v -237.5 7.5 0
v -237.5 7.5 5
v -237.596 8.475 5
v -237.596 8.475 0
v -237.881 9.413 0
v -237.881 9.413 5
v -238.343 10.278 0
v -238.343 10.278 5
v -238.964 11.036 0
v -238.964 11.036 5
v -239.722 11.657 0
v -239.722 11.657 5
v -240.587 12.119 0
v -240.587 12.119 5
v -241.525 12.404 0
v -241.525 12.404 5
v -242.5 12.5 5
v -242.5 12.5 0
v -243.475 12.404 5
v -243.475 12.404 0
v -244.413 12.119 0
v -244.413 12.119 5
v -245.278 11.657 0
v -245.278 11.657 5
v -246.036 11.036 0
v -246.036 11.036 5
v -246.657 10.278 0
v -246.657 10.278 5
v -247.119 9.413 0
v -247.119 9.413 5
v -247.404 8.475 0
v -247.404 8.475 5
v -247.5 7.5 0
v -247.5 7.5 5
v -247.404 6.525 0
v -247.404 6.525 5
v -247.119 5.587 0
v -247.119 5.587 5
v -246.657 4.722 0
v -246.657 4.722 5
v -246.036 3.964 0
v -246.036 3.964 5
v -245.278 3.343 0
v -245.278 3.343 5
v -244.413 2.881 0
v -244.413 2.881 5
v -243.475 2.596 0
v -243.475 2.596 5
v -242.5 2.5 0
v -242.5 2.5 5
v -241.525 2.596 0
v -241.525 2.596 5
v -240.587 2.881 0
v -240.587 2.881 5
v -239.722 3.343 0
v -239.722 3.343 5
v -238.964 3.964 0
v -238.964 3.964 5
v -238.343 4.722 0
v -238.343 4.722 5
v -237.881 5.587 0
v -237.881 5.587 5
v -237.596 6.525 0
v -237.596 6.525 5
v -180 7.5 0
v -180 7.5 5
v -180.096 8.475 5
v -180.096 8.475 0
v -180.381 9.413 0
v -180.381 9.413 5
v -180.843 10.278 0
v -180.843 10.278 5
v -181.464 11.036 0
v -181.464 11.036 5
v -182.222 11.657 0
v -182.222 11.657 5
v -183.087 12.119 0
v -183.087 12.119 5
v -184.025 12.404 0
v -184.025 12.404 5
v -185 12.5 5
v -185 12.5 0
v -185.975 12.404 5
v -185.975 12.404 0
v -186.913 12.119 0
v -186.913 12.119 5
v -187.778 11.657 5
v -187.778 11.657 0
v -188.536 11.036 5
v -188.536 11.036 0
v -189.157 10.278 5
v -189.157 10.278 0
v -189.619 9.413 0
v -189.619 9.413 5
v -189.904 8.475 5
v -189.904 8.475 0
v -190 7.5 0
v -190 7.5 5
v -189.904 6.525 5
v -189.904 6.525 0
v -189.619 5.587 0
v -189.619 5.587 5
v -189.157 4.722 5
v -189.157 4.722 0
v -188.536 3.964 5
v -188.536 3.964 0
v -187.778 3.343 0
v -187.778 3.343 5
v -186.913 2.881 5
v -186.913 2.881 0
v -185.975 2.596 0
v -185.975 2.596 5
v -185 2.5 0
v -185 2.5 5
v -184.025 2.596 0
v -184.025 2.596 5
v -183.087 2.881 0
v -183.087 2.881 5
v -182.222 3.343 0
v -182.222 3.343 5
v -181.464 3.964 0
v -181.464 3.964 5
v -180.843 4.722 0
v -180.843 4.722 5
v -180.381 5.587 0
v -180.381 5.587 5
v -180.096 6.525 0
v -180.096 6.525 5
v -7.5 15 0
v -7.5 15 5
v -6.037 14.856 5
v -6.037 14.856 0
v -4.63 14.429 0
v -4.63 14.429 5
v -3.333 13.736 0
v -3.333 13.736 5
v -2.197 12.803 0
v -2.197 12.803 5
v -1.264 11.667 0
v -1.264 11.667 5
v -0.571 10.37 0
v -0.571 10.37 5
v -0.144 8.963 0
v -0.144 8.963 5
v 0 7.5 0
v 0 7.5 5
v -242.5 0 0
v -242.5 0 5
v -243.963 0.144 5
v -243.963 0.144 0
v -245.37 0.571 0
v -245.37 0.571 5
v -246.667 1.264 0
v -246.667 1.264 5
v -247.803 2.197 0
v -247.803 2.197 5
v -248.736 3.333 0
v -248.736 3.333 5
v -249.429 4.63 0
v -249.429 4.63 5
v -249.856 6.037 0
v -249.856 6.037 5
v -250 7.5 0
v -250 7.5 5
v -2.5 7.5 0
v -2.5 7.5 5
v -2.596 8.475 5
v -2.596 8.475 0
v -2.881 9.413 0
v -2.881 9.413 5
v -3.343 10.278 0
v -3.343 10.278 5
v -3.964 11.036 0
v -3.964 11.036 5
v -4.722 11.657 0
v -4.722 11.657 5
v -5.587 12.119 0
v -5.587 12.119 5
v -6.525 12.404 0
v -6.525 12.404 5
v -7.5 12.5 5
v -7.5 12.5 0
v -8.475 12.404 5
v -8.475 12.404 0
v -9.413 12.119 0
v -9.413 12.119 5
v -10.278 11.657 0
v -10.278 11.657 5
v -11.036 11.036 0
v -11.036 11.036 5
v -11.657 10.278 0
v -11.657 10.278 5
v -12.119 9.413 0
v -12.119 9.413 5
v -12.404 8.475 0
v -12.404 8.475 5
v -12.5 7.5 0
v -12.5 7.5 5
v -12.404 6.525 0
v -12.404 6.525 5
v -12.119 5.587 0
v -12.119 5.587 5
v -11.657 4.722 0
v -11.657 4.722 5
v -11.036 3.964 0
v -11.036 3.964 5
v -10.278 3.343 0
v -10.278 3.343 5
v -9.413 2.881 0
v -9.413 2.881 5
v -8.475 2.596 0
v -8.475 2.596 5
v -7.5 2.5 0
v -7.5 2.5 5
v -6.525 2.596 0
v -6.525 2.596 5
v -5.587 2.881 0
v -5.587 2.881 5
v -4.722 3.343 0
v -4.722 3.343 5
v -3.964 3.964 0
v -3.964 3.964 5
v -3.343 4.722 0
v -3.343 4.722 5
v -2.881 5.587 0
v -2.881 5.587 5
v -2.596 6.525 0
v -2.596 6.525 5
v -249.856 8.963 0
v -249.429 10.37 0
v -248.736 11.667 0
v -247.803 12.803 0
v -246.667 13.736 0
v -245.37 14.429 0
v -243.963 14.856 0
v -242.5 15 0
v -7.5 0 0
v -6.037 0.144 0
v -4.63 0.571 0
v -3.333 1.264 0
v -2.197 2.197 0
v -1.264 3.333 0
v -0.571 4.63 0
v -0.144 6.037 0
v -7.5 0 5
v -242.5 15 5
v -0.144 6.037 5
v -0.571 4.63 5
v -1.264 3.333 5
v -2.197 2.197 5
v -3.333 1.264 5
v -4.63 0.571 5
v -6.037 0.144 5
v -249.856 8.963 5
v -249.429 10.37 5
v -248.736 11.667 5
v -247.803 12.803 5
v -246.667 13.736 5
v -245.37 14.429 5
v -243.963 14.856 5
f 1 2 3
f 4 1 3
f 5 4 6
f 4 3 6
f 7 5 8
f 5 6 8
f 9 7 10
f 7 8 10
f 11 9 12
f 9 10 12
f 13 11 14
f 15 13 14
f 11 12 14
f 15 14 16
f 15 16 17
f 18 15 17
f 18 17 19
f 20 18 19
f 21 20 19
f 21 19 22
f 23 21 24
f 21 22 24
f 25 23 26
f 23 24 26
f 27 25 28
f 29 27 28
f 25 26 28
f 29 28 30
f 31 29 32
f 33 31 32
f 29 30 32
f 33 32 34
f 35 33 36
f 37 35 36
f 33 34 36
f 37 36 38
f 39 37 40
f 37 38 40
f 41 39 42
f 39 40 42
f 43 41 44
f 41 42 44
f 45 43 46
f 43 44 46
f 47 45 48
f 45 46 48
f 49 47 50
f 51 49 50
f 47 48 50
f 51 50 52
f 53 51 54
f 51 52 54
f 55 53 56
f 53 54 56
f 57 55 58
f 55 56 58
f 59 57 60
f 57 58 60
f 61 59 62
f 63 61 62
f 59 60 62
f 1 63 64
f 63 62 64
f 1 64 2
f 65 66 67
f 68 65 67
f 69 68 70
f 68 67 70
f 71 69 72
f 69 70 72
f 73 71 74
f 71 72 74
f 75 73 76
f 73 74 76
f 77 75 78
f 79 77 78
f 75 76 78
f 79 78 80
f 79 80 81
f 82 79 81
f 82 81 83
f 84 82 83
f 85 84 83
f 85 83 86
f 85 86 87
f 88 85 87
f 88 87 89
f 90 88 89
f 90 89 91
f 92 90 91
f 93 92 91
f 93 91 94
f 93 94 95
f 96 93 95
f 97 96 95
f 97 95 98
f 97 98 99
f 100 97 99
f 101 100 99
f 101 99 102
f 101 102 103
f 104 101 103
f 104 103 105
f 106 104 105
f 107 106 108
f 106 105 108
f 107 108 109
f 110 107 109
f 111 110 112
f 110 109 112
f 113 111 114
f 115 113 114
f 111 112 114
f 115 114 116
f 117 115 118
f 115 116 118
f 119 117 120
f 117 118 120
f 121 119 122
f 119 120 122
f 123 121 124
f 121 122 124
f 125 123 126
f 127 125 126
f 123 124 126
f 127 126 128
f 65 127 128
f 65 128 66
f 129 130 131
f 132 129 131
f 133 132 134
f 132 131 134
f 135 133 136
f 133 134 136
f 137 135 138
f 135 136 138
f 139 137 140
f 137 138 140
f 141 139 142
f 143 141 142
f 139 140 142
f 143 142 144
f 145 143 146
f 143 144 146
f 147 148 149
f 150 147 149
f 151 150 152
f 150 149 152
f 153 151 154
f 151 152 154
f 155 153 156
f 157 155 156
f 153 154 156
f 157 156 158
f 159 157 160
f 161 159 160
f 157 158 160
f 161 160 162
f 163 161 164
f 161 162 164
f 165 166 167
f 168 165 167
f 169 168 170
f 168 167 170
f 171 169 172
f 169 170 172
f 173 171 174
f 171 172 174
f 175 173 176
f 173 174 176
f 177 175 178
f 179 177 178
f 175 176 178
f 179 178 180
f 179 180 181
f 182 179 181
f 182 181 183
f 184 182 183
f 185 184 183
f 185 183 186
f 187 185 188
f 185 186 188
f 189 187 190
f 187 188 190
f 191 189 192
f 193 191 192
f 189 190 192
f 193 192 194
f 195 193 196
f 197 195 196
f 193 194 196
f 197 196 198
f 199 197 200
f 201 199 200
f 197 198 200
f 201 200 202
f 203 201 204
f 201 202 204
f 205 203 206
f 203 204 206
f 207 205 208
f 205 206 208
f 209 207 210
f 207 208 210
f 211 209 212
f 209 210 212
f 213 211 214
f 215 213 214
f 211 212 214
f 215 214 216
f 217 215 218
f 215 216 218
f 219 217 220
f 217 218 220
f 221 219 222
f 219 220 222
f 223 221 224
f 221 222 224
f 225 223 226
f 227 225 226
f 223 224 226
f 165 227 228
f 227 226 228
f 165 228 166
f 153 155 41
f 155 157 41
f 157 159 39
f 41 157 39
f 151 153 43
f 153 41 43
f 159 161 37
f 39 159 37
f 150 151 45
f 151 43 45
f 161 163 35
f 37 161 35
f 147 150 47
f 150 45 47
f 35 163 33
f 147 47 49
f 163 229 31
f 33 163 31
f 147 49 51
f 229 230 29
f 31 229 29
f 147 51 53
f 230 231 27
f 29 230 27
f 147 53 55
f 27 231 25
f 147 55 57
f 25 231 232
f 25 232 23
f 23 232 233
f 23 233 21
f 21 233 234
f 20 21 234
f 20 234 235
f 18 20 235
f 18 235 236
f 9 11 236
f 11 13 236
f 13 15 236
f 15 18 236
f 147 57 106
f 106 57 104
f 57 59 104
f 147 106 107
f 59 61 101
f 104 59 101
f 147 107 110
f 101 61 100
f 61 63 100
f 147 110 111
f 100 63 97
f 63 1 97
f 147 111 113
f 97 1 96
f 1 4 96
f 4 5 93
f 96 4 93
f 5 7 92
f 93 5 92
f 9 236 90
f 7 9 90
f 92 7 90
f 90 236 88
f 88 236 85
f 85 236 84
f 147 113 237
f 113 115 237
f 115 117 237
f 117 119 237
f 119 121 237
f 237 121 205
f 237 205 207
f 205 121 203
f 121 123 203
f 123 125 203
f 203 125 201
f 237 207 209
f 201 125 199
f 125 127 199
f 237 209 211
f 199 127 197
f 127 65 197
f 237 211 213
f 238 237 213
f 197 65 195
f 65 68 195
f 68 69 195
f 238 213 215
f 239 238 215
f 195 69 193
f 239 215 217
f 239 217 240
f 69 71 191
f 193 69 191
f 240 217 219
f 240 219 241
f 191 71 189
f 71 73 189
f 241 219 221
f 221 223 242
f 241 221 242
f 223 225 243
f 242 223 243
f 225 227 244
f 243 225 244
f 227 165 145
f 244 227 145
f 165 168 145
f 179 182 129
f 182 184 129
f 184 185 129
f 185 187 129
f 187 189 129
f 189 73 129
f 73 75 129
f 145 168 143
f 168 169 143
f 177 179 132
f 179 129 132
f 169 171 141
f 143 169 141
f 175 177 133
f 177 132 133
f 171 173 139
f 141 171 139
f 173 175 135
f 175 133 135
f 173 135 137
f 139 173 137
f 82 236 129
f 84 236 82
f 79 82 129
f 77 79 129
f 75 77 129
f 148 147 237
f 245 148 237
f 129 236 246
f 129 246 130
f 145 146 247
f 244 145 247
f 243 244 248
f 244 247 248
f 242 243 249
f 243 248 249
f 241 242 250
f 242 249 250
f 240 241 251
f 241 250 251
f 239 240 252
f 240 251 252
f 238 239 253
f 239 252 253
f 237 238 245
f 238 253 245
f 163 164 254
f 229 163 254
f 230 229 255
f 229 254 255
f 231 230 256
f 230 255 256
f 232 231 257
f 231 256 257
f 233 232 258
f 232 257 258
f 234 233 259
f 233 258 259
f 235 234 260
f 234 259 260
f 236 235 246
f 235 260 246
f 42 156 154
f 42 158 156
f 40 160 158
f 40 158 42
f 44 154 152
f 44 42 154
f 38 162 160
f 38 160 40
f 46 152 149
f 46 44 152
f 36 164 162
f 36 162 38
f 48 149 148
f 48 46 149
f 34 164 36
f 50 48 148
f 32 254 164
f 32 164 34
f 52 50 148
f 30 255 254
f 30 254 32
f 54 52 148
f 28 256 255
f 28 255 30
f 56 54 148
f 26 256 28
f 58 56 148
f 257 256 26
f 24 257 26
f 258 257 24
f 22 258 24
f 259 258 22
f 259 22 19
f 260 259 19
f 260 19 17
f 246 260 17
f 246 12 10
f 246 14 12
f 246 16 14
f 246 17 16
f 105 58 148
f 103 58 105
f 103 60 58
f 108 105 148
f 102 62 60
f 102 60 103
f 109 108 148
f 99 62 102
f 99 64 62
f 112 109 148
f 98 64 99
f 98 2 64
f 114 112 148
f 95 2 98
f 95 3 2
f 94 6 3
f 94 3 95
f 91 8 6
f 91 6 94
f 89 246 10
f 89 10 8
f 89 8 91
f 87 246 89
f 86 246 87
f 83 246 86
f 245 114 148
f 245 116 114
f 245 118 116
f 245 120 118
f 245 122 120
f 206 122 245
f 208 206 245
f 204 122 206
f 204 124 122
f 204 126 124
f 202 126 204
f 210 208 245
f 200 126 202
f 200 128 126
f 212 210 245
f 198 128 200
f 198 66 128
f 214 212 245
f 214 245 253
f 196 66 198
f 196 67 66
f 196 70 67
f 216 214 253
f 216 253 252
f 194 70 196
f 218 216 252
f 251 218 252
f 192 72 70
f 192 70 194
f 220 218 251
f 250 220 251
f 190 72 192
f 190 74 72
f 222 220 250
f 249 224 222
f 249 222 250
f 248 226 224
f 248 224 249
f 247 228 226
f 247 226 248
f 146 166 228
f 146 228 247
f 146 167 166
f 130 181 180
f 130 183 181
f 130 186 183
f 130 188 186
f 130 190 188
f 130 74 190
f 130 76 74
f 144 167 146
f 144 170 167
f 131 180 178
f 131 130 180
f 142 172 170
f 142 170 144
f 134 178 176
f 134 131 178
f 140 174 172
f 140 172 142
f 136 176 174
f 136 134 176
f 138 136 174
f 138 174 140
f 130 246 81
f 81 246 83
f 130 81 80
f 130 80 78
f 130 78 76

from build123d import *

# Parameters (mm, degrees)
SKETCH3_W           = 250
SKETCH3_H           = 15
BOSS_EXTRUDE4_DEPTH = 5
SKETCH7_R           = 5
CUT_EXTRUDE3_DEPTH  = 5
SKETCH8_R           = 5
CUT_EXTRUDE5_DEPTH  = 6


with BuildPart() as part:
    # Sketch3 → Boss-Extrude4 (new body)
    with BuildSketch(Plane.XY):
        with Locations((-125, 7.5)):
            Rectangle(SKETCH3_W, SKETCH3_H)
    extrude(amount=BOSS_EXTRUDE4_DEPTH)

    # Sketch7 → Cut-Extrude3 (cut)
    with BuildSketch(Plane.XY.offset(5)):
        with BuildLine():
            Line((-242.499999991, 15), (-250, 15))
            Line((-250, 15), (-250, 7.5))
            ThreePointArc((-250, 7.5), (-247.803300856, 12.803300862), (-242.499999991, 15))
        make_face()
        with Locations((-242.5, 7.5)):
            Circle(SKETCH7_R)
        with BuildLine():
            ThreePointArc((-242.5, 0), (-247.803300859, 2.196699141), (-250, 7.5))
            Line((-250, 7.5), (-250, 0))
            Line((-250, 0), (-242.5, 0))
        make_face()
        with BuildLine():
            ThreePointArc((0, 7.5), (-2.196699166, 2.196699116), (-7.50000007, 0))
            Line((-7.50000007, 0), (0, 0))
            Line((0, 0), (0, 7.5))
        make_face()
        with BuildLine():
            Line((0, 15), (-7.5, 15))
            ThreePointArc((-7.5, 15), (-2.196699141, 12.803300859), (0, 7.5))
            Line((0, 7.5), (0, 15))
        make_face()
        with Locations((-7.5, 7.5)):
            Circle(SKETCH7_R)
    extrude(amount=-CUT_EXTRUDE3_DEPTH, mode=Mode.SUBTRACT)

    # Sketch8 → Cut-Extrude5 (cut, through all)
    with BuildSketch(Plane.XY.offset(5)):
        with Locations((-185, 7.5)):
            Circle(SKETCH8_R)
    extrude(amount=-CUT_EXTRUDE5_DEPTH, mode=Mode.SUBTRACT)


solid = part.part
